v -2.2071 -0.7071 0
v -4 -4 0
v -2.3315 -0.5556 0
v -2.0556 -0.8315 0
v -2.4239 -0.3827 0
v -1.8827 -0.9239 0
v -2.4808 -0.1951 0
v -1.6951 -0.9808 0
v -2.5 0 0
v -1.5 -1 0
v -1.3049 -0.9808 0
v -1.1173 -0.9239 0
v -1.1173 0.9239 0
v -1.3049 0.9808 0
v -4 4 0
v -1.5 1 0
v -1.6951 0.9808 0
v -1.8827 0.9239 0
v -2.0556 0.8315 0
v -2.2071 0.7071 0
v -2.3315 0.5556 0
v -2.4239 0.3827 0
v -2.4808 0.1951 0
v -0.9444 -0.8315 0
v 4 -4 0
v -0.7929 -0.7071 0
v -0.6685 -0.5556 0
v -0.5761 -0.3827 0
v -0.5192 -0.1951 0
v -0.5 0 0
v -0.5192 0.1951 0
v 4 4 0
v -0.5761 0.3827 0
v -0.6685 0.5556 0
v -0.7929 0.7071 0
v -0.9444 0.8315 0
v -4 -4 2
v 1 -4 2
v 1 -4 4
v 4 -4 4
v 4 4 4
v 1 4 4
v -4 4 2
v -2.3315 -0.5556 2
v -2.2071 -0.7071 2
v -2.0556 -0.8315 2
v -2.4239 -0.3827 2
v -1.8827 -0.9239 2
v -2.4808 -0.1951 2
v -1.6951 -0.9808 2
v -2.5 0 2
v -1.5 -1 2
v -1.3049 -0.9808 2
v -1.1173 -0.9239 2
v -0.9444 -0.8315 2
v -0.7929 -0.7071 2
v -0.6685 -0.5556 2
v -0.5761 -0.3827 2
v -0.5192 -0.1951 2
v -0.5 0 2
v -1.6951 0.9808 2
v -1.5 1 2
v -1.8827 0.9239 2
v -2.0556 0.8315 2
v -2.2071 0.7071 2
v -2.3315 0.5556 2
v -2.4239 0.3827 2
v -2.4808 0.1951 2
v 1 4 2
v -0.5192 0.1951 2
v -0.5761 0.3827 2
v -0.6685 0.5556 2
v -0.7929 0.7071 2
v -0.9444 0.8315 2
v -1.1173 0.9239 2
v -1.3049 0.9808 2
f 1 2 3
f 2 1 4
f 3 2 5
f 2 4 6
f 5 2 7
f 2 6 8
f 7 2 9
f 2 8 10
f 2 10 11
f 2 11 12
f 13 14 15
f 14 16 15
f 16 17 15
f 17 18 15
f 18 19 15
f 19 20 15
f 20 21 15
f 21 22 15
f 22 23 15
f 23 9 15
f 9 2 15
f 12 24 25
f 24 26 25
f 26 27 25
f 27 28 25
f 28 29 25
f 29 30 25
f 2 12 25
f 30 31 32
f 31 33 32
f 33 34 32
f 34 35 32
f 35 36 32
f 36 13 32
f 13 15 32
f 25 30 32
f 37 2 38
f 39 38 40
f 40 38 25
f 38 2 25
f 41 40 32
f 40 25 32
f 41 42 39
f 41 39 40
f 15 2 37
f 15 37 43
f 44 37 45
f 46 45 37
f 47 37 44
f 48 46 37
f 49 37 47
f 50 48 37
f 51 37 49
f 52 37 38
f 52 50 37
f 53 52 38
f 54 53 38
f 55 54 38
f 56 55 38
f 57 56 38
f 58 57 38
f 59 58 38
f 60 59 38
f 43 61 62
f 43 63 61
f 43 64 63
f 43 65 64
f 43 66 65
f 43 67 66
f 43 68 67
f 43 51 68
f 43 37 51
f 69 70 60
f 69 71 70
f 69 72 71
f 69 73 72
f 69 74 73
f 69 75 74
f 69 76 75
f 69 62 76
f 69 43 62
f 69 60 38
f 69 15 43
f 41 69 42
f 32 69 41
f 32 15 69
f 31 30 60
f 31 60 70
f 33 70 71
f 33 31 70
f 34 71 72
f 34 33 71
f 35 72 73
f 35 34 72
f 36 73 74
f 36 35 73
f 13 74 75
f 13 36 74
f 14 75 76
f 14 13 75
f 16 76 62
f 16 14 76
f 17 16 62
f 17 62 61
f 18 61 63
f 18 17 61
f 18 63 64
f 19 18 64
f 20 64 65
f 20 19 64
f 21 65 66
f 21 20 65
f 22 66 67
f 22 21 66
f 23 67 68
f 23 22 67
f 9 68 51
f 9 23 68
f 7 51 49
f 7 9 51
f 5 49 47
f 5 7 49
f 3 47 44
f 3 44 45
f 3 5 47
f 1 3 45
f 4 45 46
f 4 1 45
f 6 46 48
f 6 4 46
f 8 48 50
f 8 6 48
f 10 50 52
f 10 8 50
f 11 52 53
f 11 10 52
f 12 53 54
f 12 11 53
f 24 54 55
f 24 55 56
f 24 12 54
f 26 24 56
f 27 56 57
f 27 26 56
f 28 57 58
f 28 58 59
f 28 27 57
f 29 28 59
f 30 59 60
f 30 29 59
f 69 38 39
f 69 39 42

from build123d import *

# Parameters (mm, degrees)
F0_W     = 8
F0_H     = 8
F0_R     = 1
F1_DEPTH = 2
F2_W     = 3
F2_H     = 8
F3_DEPTH = 2


with BuildPart() as f1:
    # F0 (on Top) → F1 (new body)
    with BuildSketch(Plane.XY):
        Rectangle(F0_W, F0_H)
        with Locations((-1.5, 0)):
            Circle(F0_R, mode=Mode.SUBTRACT)
    extrude(amount=F1_DEPTH)

    # F2 (on face) → F3 (join)
    with BuildSketch(Plane.XY.offset(2)):
        with Locations((2.5, 0)):
            Rectangle(F2_W, F2_H)
    extrude(amount=F3_DEPTH)


solid = f1.part
